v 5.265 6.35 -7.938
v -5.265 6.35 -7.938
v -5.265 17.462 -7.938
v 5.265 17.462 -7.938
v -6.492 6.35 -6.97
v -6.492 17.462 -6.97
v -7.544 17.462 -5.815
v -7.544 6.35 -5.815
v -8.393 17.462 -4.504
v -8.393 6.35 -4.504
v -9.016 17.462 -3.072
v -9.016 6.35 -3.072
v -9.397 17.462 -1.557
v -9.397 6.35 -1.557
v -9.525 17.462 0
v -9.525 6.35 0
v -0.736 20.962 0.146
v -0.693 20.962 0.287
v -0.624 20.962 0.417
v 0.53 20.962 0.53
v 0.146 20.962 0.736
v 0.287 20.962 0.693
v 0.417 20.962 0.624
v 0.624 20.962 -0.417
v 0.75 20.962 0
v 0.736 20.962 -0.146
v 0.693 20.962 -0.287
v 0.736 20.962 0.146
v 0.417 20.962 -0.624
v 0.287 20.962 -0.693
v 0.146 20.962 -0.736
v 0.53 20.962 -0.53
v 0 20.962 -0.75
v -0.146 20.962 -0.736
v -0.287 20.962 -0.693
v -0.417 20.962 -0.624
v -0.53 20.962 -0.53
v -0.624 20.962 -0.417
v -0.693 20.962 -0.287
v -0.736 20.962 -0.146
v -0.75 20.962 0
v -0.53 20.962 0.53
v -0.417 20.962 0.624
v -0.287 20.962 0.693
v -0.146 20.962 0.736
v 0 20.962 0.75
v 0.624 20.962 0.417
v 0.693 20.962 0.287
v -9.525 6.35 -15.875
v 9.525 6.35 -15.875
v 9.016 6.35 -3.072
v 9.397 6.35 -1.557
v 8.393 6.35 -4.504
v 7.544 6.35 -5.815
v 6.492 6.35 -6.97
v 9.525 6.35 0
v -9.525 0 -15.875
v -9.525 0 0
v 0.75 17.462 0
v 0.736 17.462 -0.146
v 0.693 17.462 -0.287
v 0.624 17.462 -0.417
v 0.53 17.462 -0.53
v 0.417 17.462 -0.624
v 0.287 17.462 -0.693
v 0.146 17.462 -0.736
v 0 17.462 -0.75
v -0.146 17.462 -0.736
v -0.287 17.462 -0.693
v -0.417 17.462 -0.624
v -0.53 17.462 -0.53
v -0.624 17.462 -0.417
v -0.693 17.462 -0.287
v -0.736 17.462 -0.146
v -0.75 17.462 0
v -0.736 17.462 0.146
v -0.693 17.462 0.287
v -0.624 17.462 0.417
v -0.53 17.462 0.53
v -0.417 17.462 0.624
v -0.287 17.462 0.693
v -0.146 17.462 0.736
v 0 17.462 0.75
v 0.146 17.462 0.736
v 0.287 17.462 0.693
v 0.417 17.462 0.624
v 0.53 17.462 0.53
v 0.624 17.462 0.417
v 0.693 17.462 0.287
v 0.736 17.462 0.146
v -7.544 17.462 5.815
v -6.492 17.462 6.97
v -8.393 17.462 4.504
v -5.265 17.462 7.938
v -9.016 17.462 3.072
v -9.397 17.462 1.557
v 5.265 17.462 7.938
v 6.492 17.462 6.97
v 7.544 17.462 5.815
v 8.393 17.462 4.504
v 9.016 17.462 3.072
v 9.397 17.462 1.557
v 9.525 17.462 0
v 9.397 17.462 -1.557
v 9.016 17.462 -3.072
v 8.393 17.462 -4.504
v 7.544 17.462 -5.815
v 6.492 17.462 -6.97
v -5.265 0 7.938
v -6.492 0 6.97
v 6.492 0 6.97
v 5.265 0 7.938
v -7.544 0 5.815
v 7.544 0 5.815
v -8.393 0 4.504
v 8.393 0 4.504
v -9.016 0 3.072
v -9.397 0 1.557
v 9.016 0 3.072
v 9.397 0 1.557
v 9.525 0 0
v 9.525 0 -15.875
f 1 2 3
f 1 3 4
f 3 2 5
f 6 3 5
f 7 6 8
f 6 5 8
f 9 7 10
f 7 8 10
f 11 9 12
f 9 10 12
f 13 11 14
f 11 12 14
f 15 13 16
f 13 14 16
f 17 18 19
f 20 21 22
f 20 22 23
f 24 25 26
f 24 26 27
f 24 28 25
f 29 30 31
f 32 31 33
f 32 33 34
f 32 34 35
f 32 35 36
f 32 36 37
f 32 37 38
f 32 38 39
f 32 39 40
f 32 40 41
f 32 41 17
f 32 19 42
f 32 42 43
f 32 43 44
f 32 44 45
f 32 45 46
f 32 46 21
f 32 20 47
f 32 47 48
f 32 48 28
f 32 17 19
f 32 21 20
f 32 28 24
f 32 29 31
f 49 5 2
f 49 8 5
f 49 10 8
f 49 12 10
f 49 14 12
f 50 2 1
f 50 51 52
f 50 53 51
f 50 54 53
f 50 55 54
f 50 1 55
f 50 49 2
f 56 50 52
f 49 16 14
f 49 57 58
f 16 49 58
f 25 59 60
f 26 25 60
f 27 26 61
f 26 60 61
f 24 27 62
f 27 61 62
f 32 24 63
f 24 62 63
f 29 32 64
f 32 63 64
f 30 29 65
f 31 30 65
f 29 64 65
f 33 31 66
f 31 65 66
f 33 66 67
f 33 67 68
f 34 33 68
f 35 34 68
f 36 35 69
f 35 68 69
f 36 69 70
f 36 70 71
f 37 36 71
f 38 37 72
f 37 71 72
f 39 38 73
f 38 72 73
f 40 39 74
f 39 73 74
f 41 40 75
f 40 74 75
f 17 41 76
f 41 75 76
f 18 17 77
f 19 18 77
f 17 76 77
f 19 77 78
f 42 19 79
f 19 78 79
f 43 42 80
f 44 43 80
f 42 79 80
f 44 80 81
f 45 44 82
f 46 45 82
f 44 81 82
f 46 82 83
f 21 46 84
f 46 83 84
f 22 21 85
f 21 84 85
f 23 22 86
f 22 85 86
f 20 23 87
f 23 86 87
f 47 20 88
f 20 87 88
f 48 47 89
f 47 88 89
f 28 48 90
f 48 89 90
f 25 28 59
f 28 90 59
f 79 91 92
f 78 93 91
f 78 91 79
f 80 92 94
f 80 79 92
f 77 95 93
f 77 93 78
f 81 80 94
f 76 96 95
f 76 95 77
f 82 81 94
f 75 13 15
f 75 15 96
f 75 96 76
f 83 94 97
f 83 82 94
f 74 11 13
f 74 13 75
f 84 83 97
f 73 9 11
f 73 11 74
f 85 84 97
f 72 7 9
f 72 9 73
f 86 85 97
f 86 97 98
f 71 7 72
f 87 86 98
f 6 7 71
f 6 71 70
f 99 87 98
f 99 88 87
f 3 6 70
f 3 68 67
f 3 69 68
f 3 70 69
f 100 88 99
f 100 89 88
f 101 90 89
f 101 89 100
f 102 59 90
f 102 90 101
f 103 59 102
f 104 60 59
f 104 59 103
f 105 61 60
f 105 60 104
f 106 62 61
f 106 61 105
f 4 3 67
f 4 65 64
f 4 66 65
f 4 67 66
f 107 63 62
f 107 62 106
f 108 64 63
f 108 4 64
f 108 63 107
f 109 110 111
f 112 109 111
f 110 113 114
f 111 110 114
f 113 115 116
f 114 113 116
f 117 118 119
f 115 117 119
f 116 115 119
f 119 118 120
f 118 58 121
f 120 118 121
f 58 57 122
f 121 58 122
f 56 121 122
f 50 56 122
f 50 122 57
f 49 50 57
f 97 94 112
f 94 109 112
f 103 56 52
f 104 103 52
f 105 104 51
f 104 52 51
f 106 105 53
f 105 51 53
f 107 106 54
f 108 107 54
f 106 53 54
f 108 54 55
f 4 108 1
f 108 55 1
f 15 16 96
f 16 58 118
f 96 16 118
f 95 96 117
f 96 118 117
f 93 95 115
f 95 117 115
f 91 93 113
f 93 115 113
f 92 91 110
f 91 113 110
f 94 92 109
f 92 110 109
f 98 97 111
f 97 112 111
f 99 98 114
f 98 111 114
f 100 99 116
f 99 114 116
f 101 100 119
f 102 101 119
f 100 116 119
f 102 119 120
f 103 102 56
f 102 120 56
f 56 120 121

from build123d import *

# Parameters (mm, degrees)
SKETCH1_W           = 10.53028371
SKETCH1_H           = 7.9375
BOSS_EXTRUDE1_DEPTH = 6.35
SKETCH2_W           = 10.53028371
SKETCH2_H           = 15.875
BOSS_EXTRUDE2_DEPTH = 11.1125
SKETCH3_R           = 0.75
BOSS_EXTRUDE3_DEPTH = 3.5


with BuildPart() as part:
    # Sketch1 → Boss-Extrude1 (new body)
    with BuildSketch(Plane(origin=(0, 0, 0), x_dir=(1, 0, 0), z_dir=(0, 1, 0))):
        with BuildLine():
            Line((-5.265141855, 0), (-5.265141855, 7.9375))
            ThreePointArc((-5.265141855, 7.9375), (-8.392737967, 4.504173), (-9.525, 0))
            Line((-9.525, 0), (-5.265141855, 0))
        make_face()
        with BuildLine():
            Line((-5.265141855, -7.9375), (-5.265141855, 0))
            Line((-5.265141855, 0), (-9.525, 0))
            ThreePointArc((-9.525, 0), (-8.392737967, -4.504173), (-5.265141855, -7.9375))
        make_face()
        with Locations((0, -3.96875)):
            Rectangle(SKETCH1_W, SKETCH1_H)
        with BuildLine():
            ThreePointArc((9.525, 0), (8.392737967, 4.504173), (5.265141855, 7.9375))
            Line((5.265141855, 7.9375), (5.265141855, 0))
            Line((5.265141855, 0), (9.525, 0))
        make_face()
        with BuildLine():
            Line((9.525, 0), (5.265141855, 0))
            Line((5.265141855, 0), (5.265141855, -7.9375))
            ThreePointArc((5.265141855, -7.9375), (8.392737967, -4.504173), (9.525, 0))
        make_face()
        with BuildLine():
            ThreePointArc((-9.525, 0), (-8.392737967, 4.504173), (-5.265141855, 7.9375))
            ThreePointArc((-5.265141855, 7.9375), (0, 9.525), (5.265141855, 7.9375))
            ThreePointArc((5.265141855, 7.9375), (8.392737967, 4.504173), (9.525, 0))
            Line((9.525, 0), (9.525, 15.875))
            Line((9.525, 15.875), (-9.525, 15.875))
            Line((-9.525, 15.875), (-9.525, 0))
        make_face()
        with Locations((0, 3.96875)):
            Rectangle(SKETCH1_W, SKETCH1_H)
        with BuildLine():
            ThreePointArc((5.265141855, 7.9375), (0, 9.525), (-5.265141855, 7.9375))
            Line((-5.265141855, 7.9375), (5.265141855, 7.9375))
        make_face()
    extrude(amount=BOSS_EXTRUDE1_DEPTH)

    # Sketch2 → Boss-Extrude2 (add)
    with BuildSketch(Plane(origin=(0, 6.35, 0), x_dir=(1, 0, 0), z_dir=(0, 1, 0))):
        with BuildLine():
            Line((-5.265141855, -7.9375), (-5.265141855, 7.9375))
            ThreePointArc((-5.265141855, 7.9375), (-8.392737967, 4.504173), (-9.525, 0))
            ThreePointArc((-9.525, 0), (-8.392737967, -4.504173), (-5.265141855, -7.9375))
        make_face()
        Rectangle(SKETCH2_W, SKETCH2_H)
        with BuildLine():
            ThreePointArc((9.525, 0), (8.392737967, 4.504173), (5.265141855, 7.9375))
            Line((5.265141855, 7.9375), (5.265141855, -7.9375))
            ThreePointArc((5.265141855, -7.9375), (8.392737967, -4.504173), (9.525, 0))
        make_face()
    extrude(amount=BOSS_EXTRUDE2_DEPTH)

    # Sketch3 → Boss-Extrude3 (add)
    with BuildSketch(Plane(origin=(0, 17.4625, 0), x_dir=(1, 0, 0), z_dir=(0, 1, 0))):
        Circle(SKETCH3_R)
    extrude(amount=BOSS_EXTRUDE3_DEPTH)


solid = part.part
